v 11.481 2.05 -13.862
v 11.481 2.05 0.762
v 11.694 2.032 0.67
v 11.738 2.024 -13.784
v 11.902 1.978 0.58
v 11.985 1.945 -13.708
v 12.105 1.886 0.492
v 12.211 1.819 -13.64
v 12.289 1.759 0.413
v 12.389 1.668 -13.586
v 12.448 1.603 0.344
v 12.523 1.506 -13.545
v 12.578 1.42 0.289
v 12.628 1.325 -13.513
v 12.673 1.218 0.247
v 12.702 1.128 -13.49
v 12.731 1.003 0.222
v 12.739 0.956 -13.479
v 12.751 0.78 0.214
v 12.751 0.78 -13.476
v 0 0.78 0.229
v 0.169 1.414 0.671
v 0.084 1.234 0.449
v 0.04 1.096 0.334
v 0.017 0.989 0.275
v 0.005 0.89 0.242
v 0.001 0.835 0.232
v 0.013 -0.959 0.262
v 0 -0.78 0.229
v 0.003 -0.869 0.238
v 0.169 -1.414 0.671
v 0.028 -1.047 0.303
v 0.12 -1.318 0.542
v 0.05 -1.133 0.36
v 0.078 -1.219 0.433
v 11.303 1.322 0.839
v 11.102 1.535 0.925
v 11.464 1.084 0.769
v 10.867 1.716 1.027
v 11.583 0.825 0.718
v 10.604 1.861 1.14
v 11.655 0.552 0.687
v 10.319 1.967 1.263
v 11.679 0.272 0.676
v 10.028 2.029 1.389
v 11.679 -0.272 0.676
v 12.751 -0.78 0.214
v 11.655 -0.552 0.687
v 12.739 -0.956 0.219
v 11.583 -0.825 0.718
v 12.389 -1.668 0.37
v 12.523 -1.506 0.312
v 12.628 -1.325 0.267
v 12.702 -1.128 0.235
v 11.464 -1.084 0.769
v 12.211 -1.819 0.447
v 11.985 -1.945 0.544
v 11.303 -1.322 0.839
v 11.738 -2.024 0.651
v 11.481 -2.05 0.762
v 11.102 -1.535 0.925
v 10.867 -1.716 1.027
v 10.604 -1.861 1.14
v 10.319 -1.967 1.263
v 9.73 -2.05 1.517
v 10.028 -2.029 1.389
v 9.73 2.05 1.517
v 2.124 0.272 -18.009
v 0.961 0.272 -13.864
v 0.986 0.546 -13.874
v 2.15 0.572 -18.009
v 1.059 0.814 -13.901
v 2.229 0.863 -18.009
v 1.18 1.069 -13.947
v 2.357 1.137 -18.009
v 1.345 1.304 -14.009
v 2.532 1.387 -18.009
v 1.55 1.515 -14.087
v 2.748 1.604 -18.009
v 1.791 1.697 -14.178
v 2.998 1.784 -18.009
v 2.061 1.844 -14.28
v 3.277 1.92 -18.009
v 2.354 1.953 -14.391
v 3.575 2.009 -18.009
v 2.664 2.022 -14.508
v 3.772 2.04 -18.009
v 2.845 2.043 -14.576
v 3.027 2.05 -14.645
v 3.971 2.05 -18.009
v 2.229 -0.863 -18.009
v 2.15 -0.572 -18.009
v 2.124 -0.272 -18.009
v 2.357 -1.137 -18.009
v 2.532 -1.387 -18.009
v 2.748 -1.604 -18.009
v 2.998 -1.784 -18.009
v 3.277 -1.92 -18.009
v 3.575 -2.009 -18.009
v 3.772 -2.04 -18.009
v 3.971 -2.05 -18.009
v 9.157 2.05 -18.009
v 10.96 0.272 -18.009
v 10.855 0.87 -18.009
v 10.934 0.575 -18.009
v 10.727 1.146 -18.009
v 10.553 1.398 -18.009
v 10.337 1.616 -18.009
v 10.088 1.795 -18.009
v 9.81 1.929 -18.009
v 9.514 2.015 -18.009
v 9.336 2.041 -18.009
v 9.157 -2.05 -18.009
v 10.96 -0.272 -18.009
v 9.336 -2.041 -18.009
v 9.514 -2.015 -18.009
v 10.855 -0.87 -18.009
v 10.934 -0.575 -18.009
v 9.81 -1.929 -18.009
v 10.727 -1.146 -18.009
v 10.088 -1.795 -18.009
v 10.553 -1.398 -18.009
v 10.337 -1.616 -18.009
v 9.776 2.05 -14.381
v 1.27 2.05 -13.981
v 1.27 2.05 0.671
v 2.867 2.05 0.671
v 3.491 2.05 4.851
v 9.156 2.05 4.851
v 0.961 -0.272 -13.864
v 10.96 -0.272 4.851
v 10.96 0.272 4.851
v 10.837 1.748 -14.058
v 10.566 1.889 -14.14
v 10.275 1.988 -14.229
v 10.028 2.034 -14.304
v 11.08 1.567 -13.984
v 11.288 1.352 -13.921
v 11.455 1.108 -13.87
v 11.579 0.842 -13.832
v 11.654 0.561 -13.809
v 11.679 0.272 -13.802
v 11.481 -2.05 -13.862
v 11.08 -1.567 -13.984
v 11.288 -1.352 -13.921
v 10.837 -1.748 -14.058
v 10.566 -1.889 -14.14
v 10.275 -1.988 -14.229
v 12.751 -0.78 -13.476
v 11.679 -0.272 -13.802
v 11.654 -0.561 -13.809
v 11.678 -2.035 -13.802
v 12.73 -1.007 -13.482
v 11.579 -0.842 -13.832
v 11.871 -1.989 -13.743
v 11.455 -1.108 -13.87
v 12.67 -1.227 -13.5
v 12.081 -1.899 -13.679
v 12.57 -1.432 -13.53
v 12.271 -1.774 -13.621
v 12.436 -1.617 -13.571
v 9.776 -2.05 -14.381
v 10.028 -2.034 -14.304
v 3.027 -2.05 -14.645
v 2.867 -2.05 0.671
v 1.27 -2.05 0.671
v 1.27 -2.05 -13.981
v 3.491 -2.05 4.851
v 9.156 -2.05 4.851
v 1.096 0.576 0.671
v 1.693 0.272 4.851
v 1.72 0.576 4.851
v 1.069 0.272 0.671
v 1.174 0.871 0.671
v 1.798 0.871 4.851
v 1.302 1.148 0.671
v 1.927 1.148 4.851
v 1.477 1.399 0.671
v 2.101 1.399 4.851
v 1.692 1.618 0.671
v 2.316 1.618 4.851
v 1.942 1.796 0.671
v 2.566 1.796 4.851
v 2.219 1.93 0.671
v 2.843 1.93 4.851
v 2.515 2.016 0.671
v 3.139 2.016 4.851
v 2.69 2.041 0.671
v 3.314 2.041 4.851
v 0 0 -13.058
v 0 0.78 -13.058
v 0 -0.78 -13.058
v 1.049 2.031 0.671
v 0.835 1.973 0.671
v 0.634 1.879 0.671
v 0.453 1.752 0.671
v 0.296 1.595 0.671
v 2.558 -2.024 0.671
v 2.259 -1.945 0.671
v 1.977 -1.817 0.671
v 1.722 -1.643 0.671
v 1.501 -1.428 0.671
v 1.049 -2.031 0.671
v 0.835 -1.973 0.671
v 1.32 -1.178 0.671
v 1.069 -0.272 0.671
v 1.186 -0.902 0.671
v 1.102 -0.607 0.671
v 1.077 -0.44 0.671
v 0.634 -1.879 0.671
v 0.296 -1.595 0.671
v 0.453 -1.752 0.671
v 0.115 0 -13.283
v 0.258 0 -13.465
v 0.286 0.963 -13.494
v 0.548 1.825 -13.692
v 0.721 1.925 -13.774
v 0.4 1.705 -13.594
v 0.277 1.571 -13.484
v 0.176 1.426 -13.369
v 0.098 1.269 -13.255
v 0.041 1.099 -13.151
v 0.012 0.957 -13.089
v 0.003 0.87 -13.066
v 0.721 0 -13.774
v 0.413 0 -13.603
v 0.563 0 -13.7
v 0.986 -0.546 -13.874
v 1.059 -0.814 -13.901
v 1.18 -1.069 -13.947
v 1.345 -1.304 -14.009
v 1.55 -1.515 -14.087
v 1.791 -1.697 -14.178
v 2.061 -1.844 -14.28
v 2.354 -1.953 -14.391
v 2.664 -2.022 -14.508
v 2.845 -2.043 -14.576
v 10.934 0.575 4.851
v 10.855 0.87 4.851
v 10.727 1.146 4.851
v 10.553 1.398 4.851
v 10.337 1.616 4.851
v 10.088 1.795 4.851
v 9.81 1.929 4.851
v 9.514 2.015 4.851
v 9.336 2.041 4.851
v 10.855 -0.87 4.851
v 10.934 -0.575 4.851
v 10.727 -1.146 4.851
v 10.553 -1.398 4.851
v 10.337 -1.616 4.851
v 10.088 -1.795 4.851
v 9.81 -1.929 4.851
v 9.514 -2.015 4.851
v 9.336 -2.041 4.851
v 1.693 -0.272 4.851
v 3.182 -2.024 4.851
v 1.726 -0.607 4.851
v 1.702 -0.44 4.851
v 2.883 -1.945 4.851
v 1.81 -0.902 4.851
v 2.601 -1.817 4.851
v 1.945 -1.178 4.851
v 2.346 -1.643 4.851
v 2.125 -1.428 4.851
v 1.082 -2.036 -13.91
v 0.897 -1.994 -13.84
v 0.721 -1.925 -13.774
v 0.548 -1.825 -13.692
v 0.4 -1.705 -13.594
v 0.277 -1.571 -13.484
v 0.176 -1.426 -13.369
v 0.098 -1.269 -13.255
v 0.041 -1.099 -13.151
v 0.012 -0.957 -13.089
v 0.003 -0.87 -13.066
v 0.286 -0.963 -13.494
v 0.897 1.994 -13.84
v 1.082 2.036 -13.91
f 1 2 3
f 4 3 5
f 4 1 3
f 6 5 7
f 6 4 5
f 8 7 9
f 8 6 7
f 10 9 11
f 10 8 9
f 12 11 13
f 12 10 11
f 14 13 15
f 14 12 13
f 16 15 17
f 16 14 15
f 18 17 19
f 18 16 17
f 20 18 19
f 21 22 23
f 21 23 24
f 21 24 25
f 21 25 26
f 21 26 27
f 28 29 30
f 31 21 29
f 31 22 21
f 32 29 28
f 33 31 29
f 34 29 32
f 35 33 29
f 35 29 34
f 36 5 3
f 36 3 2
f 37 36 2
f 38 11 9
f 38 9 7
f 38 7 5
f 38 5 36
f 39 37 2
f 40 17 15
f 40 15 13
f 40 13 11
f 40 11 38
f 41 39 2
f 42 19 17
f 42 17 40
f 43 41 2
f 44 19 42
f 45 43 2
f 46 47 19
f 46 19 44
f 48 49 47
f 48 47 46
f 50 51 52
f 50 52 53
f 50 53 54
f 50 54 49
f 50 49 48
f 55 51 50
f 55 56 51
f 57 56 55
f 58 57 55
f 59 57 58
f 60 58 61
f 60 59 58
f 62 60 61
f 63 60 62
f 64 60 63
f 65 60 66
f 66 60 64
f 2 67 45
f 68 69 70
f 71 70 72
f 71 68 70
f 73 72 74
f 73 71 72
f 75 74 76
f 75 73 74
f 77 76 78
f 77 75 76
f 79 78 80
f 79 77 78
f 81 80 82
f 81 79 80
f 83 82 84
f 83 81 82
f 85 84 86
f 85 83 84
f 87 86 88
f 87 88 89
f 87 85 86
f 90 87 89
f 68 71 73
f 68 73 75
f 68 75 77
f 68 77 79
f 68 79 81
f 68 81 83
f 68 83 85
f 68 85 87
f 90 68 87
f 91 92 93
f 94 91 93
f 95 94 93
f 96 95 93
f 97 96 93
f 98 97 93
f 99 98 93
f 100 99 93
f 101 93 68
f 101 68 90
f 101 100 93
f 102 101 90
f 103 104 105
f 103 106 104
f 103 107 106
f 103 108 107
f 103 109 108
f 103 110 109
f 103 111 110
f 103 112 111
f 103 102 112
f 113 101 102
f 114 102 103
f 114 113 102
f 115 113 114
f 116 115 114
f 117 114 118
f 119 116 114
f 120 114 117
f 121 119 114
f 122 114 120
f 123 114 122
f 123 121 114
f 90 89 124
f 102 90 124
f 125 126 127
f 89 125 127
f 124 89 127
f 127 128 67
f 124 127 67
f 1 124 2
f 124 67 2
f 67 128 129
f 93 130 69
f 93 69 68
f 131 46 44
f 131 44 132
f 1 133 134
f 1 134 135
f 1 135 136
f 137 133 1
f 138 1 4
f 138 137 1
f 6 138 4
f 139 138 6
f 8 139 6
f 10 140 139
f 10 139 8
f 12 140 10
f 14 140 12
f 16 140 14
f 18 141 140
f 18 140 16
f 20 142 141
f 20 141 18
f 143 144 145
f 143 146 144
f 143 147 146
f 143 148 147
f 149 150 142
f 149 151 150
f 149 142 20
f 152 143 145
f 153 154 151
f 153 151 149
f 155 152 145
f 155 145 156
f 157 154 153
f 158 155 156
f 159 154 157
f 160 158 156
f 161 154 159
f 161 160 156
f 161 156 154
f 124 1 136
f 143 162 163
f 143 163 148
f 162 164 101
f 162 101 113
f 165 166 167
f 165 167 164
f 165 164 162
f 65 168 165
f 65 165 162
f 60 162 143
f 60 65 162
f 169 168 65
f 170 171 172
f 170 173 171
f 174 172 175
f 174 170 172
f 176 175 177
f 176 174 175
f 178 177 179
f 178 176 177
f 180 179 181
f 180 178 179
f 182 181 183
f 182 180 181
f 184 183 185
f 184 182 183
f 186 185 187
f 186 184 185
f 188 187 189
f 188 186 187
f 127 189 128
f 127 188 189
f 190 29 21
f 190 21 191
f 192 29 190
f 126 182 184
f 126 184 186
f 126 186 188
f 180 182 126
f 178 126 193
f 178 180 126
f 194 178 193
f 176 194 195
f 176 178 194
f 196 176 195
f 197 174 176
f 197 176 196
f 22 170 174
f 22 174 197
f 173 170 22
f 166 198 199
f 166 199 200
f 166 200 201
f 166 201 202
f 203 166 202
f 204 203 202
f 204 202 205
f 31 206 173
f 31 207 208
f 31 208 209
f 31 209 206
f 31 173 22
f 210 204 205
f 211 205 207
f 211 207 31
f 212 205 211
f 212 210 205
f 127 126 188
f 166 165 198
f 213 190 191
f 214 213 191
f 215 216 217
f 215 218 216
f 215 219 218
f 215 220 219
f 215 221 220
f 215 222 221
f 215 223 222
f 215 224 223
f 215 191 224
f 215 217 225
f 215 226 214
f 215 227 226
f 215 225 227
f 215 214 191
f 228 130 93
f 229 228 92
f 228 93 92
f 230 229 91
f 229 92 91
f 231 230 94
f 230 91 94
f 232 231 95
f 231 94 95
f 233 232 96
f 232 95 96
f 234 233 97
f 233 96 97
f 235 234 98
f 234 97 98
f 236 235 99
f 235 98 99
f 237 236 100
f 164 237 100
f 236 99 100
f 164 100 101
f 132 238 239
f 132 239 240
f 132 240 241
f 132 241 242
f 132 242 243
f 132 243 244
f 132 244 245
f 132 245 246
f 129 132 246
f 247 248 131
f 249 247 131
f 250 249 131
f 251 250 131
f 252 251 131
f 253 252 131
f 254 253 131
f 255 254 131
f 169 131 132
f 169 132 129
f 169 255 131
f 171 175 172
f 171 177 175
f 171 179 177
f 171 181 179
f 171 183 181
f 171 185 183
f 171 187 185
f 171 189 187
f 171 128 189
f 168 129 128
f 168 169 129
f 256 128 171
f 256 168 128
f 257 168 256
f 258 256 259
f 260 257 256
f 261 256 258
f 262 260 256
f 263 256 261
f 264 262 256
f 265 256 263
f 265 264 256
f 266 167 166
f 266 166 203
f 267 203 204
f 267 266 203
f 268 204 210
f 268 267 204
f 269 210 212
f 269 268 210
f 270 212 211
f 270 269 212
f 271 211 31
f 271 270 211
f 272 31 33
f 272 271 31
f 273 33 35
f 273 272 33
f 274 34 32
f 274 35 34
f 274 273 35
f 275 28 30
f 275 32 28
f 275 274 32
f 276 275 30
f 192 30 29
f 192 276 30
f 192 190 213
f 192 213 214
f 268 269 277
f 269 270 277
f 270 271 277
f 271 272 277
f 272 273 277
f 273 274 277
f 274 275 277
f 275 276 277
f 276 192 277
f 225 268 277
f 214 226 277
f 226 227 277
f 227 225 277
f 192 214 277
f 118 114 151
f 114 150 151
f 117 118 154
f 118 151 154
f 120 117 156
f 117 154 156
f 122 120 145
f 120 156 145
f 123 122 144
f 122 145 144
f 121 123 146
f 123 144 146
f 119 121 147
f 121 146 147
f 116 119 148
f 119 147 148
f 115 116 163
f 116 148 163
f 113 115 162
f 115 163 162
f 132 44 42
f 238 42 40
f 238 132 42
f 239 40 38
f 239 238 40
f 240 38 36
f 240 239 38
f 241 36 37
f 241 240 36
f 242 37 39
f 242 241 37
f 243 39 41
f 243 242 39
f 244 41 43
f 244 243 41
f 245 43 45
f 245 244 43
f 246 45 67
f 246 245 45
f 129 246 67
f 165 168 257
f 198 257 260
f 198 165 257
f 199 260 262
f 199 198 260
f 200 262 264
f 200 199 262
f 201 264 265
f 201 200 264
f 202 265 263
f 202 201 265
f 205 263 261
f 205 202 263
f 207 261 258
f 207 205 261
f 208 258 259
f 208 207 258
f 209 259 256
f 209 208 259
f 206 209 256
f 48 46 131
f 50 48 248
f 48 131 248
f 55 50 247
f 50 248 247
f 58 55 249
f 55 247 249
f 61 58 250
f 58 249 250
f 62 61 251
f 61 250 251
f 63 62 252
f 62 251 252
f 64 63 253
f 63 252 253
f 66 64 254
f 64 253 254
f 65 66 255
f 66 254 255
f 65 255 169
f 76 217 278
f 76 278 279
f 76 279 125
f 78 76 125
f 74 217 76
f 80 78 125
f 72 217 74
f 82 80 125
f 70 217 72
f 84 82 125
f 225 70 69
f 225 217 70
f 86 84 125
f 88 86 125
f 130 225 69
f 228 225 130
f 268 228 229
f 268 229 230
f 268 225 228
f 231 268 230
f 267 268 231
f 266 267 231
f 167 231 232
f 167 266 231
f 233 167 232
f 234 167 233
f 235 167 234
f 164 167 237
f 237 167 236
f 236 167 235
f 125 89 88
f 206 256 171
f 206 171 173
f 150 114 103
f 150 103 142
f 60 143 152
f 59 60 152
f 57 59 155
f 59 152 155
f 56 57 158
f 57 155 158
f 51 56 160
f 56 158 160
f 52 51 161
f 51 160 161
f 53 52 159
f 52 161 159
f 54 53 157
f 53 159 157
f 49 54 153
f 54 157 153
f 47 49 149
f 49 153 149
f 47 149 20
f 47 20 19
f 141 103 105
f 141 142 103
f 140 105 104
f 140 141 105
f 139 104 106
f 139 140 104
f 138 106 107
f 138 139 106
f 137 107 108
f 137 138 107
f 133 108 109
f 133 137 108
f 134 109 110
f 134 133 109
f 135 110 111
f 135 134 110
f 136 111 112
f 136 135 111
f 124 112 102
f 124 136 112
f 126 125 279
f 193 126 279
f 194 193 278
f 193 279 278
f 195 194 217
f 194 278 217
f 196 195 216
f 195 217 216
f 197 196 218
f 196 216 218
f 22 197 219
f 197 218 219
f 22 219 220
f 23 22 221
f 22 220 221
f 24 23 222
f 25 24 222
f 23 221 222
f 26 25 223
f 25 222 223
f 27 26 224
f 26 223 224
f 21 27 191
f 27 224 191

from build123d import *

# Parameters (mm, degrees)
F1_DEPTH    = 2.05
F2_R        = 1.778
F3_T1_DEPTH = 21.8600313558
F3_T3_DEPTH = 20.039287103


# Not quite as in the source:
# - a fillet or chamfer that OpenCascade refuses, or shapes differently, is made with other operations: its cross-section is extruded or revolved along the edge and cut away or added


with BuildPart() as f1:
    # F0 (on Front) → F1 (new body, symmetric)
    with BuildSketch(Plane.XZ):
        with BuildLine():
            Line((10.9602659295, 4.8513999983), (9.6458090239, 4.8513999983))
            add(Edge.make_bspline(
                [(9.6458090239, 4.8513999983), (7.4316049079, 4.8513999983), (5.2174007918, 4.8513999983), (3.0031966758, 4.8513999983)],
                knots=[0, 0, 0, 0, 1, 1, 1, 1], degree=3))
            Line((3.0031966758, 4.8513999983), (1.6934335208, 4.8513999983))
            Line((1.6934335208, 4.8513999983), (1.0692595786, 0.6714852005))
            Line((1.0692595786, 0.6714852005), (0.1693212299, 0.6714852005))
            Line((0.1693212299, 0.6714852005), (-6.1e-09, 0.2293704145))
            Line((-6.1e-09, 0.2293704145), (2.07e-08, -13.0581609413))
            add(Edge.make_bspline(
                [(2.07e-08, -13.0581609413), (0.2048945317, -13.5783853515), (0.7213722482, -13.7736584116)],
                knots=[5.4605557212, 5.4605557212, 5.4605557212, 6.2831853072, 6.2831853072, 6.2831853072], degree=2, weights=[1, 0.9165959415, 1]))
            Line((0.7213722482, -13.7736584116), (0.9610938358, -13.8642938587))
            Line((0.9610938358, -13.8642938587), (2.1238978538, -18.0086))
            Line((2.1238978538, -18.0086), (3.4693217803, -18.0086))
            add(Edge.make_bspline(
                [(9.646094231, -18.0086), (7.5871700808, -18.0086), (5.5282459306, -18.0086), (3.4693217803, -18.0086)],
                knots=[0, 0, 0, 0, 1, 1, 1, 1], degree=3))
            Line((9.646094231, -18.0086), (10.9602659326, -18.0086))
            Line((10.9602659326, -18.0086), (11.6790564953, -13.801625983))
            Line((11.6790564953, -13.801625983), (12.7507999945, -13.4755201564))
            Line((12.7507999945, -13.4755201564), (12.7507999945, 0.2137669466))
            Line((12.7507999945, 0.2137669466), (11.679056502, 0.6762536924))
            Line((11.679056502, 0.6762536924), (10.9602659295, 4.8513999983))
        make_face()
    extrude(amount=F1_DEPTH, both=True)

    # F2
    f2_edges = [f1.edges().sort_by_distance(p)[0] for p in [
        (1.381347, -2.05, 2.761443),
        (1.381347, 2.05, 2.761443),
        (11.319661, -2.05, 2.763827),
        (11.319661, 2.05, 2.763827),
        (11.319661, -2.05, -15.905113),
        (1.542496, -2.05, -15.936447),
        (11.319661, 2.05, -15.905113),
        (1.542496, 2.05, -15.936447),
    ]]
    fillet(f2_edges, radius=F2_R)

    # F3: fillet of radius 1.27 on 4 edges, made by hand

    # F3_s2 → F3_t1 (cut)
    with BuildSketch(Plane.XY.offset(-16.2331609413)):
        with BuildLine():
            ThreePointArc((1.269999983, -2.05), (0.3719743709, -1.6780256121), (-1.7e-08, -0.78))
            Line((-1.7e-08, -0.78), (-1.7e-08, -2.05))
            Line((-1.7e-08, -2.05), (1.269999983, -2.05))
        make_face()
        with BuildLine():
            ThreePointArc((1.269999983, 2.05), (0.3719743709, 1.6780256121), (-1.7e-08, 0.78))
            Line((-1.7e-08, 0.78), (-1.7e-08, 2.05))
            Line((-1.7e-08, 2.05), (1.269999983, 2.05))
        make_face()
    extrude(amount=F3_T1_DEPTH, mode=Mode.SUBTRACT)

    # F3_s4 → F3_t3 (cut)
    with BuildSketch(Plane.XY.offset(-16.6505201564)):
        with BuildLine():
            ThreePointArc((11.4807999945, 2.05), (12.3788256067, 1.6780256121), (12.7507999945, 0.78))
            Line((12.7507999945, 0.78), (12.7507999945, 2.05))
            Line((12.7507999945, 2.05), (11.4807999945, 2.05))
        make_face()
        with BuildLine():
            ThreePointArc((11.4807999945, -2.05), (12.3788256067, -1.6780256121), (12.7507999945, -0.78))
            Line((12.7507999945, -0.78), (12.7507999945, -2.05))
            Line((12.7507999945, -2.05), (11.4807999945, -2.05))
        make_face()
    extrude(amount=F3_T3_DEPTH, mode=Mode.SUBTRACT)


solid = f1.part
